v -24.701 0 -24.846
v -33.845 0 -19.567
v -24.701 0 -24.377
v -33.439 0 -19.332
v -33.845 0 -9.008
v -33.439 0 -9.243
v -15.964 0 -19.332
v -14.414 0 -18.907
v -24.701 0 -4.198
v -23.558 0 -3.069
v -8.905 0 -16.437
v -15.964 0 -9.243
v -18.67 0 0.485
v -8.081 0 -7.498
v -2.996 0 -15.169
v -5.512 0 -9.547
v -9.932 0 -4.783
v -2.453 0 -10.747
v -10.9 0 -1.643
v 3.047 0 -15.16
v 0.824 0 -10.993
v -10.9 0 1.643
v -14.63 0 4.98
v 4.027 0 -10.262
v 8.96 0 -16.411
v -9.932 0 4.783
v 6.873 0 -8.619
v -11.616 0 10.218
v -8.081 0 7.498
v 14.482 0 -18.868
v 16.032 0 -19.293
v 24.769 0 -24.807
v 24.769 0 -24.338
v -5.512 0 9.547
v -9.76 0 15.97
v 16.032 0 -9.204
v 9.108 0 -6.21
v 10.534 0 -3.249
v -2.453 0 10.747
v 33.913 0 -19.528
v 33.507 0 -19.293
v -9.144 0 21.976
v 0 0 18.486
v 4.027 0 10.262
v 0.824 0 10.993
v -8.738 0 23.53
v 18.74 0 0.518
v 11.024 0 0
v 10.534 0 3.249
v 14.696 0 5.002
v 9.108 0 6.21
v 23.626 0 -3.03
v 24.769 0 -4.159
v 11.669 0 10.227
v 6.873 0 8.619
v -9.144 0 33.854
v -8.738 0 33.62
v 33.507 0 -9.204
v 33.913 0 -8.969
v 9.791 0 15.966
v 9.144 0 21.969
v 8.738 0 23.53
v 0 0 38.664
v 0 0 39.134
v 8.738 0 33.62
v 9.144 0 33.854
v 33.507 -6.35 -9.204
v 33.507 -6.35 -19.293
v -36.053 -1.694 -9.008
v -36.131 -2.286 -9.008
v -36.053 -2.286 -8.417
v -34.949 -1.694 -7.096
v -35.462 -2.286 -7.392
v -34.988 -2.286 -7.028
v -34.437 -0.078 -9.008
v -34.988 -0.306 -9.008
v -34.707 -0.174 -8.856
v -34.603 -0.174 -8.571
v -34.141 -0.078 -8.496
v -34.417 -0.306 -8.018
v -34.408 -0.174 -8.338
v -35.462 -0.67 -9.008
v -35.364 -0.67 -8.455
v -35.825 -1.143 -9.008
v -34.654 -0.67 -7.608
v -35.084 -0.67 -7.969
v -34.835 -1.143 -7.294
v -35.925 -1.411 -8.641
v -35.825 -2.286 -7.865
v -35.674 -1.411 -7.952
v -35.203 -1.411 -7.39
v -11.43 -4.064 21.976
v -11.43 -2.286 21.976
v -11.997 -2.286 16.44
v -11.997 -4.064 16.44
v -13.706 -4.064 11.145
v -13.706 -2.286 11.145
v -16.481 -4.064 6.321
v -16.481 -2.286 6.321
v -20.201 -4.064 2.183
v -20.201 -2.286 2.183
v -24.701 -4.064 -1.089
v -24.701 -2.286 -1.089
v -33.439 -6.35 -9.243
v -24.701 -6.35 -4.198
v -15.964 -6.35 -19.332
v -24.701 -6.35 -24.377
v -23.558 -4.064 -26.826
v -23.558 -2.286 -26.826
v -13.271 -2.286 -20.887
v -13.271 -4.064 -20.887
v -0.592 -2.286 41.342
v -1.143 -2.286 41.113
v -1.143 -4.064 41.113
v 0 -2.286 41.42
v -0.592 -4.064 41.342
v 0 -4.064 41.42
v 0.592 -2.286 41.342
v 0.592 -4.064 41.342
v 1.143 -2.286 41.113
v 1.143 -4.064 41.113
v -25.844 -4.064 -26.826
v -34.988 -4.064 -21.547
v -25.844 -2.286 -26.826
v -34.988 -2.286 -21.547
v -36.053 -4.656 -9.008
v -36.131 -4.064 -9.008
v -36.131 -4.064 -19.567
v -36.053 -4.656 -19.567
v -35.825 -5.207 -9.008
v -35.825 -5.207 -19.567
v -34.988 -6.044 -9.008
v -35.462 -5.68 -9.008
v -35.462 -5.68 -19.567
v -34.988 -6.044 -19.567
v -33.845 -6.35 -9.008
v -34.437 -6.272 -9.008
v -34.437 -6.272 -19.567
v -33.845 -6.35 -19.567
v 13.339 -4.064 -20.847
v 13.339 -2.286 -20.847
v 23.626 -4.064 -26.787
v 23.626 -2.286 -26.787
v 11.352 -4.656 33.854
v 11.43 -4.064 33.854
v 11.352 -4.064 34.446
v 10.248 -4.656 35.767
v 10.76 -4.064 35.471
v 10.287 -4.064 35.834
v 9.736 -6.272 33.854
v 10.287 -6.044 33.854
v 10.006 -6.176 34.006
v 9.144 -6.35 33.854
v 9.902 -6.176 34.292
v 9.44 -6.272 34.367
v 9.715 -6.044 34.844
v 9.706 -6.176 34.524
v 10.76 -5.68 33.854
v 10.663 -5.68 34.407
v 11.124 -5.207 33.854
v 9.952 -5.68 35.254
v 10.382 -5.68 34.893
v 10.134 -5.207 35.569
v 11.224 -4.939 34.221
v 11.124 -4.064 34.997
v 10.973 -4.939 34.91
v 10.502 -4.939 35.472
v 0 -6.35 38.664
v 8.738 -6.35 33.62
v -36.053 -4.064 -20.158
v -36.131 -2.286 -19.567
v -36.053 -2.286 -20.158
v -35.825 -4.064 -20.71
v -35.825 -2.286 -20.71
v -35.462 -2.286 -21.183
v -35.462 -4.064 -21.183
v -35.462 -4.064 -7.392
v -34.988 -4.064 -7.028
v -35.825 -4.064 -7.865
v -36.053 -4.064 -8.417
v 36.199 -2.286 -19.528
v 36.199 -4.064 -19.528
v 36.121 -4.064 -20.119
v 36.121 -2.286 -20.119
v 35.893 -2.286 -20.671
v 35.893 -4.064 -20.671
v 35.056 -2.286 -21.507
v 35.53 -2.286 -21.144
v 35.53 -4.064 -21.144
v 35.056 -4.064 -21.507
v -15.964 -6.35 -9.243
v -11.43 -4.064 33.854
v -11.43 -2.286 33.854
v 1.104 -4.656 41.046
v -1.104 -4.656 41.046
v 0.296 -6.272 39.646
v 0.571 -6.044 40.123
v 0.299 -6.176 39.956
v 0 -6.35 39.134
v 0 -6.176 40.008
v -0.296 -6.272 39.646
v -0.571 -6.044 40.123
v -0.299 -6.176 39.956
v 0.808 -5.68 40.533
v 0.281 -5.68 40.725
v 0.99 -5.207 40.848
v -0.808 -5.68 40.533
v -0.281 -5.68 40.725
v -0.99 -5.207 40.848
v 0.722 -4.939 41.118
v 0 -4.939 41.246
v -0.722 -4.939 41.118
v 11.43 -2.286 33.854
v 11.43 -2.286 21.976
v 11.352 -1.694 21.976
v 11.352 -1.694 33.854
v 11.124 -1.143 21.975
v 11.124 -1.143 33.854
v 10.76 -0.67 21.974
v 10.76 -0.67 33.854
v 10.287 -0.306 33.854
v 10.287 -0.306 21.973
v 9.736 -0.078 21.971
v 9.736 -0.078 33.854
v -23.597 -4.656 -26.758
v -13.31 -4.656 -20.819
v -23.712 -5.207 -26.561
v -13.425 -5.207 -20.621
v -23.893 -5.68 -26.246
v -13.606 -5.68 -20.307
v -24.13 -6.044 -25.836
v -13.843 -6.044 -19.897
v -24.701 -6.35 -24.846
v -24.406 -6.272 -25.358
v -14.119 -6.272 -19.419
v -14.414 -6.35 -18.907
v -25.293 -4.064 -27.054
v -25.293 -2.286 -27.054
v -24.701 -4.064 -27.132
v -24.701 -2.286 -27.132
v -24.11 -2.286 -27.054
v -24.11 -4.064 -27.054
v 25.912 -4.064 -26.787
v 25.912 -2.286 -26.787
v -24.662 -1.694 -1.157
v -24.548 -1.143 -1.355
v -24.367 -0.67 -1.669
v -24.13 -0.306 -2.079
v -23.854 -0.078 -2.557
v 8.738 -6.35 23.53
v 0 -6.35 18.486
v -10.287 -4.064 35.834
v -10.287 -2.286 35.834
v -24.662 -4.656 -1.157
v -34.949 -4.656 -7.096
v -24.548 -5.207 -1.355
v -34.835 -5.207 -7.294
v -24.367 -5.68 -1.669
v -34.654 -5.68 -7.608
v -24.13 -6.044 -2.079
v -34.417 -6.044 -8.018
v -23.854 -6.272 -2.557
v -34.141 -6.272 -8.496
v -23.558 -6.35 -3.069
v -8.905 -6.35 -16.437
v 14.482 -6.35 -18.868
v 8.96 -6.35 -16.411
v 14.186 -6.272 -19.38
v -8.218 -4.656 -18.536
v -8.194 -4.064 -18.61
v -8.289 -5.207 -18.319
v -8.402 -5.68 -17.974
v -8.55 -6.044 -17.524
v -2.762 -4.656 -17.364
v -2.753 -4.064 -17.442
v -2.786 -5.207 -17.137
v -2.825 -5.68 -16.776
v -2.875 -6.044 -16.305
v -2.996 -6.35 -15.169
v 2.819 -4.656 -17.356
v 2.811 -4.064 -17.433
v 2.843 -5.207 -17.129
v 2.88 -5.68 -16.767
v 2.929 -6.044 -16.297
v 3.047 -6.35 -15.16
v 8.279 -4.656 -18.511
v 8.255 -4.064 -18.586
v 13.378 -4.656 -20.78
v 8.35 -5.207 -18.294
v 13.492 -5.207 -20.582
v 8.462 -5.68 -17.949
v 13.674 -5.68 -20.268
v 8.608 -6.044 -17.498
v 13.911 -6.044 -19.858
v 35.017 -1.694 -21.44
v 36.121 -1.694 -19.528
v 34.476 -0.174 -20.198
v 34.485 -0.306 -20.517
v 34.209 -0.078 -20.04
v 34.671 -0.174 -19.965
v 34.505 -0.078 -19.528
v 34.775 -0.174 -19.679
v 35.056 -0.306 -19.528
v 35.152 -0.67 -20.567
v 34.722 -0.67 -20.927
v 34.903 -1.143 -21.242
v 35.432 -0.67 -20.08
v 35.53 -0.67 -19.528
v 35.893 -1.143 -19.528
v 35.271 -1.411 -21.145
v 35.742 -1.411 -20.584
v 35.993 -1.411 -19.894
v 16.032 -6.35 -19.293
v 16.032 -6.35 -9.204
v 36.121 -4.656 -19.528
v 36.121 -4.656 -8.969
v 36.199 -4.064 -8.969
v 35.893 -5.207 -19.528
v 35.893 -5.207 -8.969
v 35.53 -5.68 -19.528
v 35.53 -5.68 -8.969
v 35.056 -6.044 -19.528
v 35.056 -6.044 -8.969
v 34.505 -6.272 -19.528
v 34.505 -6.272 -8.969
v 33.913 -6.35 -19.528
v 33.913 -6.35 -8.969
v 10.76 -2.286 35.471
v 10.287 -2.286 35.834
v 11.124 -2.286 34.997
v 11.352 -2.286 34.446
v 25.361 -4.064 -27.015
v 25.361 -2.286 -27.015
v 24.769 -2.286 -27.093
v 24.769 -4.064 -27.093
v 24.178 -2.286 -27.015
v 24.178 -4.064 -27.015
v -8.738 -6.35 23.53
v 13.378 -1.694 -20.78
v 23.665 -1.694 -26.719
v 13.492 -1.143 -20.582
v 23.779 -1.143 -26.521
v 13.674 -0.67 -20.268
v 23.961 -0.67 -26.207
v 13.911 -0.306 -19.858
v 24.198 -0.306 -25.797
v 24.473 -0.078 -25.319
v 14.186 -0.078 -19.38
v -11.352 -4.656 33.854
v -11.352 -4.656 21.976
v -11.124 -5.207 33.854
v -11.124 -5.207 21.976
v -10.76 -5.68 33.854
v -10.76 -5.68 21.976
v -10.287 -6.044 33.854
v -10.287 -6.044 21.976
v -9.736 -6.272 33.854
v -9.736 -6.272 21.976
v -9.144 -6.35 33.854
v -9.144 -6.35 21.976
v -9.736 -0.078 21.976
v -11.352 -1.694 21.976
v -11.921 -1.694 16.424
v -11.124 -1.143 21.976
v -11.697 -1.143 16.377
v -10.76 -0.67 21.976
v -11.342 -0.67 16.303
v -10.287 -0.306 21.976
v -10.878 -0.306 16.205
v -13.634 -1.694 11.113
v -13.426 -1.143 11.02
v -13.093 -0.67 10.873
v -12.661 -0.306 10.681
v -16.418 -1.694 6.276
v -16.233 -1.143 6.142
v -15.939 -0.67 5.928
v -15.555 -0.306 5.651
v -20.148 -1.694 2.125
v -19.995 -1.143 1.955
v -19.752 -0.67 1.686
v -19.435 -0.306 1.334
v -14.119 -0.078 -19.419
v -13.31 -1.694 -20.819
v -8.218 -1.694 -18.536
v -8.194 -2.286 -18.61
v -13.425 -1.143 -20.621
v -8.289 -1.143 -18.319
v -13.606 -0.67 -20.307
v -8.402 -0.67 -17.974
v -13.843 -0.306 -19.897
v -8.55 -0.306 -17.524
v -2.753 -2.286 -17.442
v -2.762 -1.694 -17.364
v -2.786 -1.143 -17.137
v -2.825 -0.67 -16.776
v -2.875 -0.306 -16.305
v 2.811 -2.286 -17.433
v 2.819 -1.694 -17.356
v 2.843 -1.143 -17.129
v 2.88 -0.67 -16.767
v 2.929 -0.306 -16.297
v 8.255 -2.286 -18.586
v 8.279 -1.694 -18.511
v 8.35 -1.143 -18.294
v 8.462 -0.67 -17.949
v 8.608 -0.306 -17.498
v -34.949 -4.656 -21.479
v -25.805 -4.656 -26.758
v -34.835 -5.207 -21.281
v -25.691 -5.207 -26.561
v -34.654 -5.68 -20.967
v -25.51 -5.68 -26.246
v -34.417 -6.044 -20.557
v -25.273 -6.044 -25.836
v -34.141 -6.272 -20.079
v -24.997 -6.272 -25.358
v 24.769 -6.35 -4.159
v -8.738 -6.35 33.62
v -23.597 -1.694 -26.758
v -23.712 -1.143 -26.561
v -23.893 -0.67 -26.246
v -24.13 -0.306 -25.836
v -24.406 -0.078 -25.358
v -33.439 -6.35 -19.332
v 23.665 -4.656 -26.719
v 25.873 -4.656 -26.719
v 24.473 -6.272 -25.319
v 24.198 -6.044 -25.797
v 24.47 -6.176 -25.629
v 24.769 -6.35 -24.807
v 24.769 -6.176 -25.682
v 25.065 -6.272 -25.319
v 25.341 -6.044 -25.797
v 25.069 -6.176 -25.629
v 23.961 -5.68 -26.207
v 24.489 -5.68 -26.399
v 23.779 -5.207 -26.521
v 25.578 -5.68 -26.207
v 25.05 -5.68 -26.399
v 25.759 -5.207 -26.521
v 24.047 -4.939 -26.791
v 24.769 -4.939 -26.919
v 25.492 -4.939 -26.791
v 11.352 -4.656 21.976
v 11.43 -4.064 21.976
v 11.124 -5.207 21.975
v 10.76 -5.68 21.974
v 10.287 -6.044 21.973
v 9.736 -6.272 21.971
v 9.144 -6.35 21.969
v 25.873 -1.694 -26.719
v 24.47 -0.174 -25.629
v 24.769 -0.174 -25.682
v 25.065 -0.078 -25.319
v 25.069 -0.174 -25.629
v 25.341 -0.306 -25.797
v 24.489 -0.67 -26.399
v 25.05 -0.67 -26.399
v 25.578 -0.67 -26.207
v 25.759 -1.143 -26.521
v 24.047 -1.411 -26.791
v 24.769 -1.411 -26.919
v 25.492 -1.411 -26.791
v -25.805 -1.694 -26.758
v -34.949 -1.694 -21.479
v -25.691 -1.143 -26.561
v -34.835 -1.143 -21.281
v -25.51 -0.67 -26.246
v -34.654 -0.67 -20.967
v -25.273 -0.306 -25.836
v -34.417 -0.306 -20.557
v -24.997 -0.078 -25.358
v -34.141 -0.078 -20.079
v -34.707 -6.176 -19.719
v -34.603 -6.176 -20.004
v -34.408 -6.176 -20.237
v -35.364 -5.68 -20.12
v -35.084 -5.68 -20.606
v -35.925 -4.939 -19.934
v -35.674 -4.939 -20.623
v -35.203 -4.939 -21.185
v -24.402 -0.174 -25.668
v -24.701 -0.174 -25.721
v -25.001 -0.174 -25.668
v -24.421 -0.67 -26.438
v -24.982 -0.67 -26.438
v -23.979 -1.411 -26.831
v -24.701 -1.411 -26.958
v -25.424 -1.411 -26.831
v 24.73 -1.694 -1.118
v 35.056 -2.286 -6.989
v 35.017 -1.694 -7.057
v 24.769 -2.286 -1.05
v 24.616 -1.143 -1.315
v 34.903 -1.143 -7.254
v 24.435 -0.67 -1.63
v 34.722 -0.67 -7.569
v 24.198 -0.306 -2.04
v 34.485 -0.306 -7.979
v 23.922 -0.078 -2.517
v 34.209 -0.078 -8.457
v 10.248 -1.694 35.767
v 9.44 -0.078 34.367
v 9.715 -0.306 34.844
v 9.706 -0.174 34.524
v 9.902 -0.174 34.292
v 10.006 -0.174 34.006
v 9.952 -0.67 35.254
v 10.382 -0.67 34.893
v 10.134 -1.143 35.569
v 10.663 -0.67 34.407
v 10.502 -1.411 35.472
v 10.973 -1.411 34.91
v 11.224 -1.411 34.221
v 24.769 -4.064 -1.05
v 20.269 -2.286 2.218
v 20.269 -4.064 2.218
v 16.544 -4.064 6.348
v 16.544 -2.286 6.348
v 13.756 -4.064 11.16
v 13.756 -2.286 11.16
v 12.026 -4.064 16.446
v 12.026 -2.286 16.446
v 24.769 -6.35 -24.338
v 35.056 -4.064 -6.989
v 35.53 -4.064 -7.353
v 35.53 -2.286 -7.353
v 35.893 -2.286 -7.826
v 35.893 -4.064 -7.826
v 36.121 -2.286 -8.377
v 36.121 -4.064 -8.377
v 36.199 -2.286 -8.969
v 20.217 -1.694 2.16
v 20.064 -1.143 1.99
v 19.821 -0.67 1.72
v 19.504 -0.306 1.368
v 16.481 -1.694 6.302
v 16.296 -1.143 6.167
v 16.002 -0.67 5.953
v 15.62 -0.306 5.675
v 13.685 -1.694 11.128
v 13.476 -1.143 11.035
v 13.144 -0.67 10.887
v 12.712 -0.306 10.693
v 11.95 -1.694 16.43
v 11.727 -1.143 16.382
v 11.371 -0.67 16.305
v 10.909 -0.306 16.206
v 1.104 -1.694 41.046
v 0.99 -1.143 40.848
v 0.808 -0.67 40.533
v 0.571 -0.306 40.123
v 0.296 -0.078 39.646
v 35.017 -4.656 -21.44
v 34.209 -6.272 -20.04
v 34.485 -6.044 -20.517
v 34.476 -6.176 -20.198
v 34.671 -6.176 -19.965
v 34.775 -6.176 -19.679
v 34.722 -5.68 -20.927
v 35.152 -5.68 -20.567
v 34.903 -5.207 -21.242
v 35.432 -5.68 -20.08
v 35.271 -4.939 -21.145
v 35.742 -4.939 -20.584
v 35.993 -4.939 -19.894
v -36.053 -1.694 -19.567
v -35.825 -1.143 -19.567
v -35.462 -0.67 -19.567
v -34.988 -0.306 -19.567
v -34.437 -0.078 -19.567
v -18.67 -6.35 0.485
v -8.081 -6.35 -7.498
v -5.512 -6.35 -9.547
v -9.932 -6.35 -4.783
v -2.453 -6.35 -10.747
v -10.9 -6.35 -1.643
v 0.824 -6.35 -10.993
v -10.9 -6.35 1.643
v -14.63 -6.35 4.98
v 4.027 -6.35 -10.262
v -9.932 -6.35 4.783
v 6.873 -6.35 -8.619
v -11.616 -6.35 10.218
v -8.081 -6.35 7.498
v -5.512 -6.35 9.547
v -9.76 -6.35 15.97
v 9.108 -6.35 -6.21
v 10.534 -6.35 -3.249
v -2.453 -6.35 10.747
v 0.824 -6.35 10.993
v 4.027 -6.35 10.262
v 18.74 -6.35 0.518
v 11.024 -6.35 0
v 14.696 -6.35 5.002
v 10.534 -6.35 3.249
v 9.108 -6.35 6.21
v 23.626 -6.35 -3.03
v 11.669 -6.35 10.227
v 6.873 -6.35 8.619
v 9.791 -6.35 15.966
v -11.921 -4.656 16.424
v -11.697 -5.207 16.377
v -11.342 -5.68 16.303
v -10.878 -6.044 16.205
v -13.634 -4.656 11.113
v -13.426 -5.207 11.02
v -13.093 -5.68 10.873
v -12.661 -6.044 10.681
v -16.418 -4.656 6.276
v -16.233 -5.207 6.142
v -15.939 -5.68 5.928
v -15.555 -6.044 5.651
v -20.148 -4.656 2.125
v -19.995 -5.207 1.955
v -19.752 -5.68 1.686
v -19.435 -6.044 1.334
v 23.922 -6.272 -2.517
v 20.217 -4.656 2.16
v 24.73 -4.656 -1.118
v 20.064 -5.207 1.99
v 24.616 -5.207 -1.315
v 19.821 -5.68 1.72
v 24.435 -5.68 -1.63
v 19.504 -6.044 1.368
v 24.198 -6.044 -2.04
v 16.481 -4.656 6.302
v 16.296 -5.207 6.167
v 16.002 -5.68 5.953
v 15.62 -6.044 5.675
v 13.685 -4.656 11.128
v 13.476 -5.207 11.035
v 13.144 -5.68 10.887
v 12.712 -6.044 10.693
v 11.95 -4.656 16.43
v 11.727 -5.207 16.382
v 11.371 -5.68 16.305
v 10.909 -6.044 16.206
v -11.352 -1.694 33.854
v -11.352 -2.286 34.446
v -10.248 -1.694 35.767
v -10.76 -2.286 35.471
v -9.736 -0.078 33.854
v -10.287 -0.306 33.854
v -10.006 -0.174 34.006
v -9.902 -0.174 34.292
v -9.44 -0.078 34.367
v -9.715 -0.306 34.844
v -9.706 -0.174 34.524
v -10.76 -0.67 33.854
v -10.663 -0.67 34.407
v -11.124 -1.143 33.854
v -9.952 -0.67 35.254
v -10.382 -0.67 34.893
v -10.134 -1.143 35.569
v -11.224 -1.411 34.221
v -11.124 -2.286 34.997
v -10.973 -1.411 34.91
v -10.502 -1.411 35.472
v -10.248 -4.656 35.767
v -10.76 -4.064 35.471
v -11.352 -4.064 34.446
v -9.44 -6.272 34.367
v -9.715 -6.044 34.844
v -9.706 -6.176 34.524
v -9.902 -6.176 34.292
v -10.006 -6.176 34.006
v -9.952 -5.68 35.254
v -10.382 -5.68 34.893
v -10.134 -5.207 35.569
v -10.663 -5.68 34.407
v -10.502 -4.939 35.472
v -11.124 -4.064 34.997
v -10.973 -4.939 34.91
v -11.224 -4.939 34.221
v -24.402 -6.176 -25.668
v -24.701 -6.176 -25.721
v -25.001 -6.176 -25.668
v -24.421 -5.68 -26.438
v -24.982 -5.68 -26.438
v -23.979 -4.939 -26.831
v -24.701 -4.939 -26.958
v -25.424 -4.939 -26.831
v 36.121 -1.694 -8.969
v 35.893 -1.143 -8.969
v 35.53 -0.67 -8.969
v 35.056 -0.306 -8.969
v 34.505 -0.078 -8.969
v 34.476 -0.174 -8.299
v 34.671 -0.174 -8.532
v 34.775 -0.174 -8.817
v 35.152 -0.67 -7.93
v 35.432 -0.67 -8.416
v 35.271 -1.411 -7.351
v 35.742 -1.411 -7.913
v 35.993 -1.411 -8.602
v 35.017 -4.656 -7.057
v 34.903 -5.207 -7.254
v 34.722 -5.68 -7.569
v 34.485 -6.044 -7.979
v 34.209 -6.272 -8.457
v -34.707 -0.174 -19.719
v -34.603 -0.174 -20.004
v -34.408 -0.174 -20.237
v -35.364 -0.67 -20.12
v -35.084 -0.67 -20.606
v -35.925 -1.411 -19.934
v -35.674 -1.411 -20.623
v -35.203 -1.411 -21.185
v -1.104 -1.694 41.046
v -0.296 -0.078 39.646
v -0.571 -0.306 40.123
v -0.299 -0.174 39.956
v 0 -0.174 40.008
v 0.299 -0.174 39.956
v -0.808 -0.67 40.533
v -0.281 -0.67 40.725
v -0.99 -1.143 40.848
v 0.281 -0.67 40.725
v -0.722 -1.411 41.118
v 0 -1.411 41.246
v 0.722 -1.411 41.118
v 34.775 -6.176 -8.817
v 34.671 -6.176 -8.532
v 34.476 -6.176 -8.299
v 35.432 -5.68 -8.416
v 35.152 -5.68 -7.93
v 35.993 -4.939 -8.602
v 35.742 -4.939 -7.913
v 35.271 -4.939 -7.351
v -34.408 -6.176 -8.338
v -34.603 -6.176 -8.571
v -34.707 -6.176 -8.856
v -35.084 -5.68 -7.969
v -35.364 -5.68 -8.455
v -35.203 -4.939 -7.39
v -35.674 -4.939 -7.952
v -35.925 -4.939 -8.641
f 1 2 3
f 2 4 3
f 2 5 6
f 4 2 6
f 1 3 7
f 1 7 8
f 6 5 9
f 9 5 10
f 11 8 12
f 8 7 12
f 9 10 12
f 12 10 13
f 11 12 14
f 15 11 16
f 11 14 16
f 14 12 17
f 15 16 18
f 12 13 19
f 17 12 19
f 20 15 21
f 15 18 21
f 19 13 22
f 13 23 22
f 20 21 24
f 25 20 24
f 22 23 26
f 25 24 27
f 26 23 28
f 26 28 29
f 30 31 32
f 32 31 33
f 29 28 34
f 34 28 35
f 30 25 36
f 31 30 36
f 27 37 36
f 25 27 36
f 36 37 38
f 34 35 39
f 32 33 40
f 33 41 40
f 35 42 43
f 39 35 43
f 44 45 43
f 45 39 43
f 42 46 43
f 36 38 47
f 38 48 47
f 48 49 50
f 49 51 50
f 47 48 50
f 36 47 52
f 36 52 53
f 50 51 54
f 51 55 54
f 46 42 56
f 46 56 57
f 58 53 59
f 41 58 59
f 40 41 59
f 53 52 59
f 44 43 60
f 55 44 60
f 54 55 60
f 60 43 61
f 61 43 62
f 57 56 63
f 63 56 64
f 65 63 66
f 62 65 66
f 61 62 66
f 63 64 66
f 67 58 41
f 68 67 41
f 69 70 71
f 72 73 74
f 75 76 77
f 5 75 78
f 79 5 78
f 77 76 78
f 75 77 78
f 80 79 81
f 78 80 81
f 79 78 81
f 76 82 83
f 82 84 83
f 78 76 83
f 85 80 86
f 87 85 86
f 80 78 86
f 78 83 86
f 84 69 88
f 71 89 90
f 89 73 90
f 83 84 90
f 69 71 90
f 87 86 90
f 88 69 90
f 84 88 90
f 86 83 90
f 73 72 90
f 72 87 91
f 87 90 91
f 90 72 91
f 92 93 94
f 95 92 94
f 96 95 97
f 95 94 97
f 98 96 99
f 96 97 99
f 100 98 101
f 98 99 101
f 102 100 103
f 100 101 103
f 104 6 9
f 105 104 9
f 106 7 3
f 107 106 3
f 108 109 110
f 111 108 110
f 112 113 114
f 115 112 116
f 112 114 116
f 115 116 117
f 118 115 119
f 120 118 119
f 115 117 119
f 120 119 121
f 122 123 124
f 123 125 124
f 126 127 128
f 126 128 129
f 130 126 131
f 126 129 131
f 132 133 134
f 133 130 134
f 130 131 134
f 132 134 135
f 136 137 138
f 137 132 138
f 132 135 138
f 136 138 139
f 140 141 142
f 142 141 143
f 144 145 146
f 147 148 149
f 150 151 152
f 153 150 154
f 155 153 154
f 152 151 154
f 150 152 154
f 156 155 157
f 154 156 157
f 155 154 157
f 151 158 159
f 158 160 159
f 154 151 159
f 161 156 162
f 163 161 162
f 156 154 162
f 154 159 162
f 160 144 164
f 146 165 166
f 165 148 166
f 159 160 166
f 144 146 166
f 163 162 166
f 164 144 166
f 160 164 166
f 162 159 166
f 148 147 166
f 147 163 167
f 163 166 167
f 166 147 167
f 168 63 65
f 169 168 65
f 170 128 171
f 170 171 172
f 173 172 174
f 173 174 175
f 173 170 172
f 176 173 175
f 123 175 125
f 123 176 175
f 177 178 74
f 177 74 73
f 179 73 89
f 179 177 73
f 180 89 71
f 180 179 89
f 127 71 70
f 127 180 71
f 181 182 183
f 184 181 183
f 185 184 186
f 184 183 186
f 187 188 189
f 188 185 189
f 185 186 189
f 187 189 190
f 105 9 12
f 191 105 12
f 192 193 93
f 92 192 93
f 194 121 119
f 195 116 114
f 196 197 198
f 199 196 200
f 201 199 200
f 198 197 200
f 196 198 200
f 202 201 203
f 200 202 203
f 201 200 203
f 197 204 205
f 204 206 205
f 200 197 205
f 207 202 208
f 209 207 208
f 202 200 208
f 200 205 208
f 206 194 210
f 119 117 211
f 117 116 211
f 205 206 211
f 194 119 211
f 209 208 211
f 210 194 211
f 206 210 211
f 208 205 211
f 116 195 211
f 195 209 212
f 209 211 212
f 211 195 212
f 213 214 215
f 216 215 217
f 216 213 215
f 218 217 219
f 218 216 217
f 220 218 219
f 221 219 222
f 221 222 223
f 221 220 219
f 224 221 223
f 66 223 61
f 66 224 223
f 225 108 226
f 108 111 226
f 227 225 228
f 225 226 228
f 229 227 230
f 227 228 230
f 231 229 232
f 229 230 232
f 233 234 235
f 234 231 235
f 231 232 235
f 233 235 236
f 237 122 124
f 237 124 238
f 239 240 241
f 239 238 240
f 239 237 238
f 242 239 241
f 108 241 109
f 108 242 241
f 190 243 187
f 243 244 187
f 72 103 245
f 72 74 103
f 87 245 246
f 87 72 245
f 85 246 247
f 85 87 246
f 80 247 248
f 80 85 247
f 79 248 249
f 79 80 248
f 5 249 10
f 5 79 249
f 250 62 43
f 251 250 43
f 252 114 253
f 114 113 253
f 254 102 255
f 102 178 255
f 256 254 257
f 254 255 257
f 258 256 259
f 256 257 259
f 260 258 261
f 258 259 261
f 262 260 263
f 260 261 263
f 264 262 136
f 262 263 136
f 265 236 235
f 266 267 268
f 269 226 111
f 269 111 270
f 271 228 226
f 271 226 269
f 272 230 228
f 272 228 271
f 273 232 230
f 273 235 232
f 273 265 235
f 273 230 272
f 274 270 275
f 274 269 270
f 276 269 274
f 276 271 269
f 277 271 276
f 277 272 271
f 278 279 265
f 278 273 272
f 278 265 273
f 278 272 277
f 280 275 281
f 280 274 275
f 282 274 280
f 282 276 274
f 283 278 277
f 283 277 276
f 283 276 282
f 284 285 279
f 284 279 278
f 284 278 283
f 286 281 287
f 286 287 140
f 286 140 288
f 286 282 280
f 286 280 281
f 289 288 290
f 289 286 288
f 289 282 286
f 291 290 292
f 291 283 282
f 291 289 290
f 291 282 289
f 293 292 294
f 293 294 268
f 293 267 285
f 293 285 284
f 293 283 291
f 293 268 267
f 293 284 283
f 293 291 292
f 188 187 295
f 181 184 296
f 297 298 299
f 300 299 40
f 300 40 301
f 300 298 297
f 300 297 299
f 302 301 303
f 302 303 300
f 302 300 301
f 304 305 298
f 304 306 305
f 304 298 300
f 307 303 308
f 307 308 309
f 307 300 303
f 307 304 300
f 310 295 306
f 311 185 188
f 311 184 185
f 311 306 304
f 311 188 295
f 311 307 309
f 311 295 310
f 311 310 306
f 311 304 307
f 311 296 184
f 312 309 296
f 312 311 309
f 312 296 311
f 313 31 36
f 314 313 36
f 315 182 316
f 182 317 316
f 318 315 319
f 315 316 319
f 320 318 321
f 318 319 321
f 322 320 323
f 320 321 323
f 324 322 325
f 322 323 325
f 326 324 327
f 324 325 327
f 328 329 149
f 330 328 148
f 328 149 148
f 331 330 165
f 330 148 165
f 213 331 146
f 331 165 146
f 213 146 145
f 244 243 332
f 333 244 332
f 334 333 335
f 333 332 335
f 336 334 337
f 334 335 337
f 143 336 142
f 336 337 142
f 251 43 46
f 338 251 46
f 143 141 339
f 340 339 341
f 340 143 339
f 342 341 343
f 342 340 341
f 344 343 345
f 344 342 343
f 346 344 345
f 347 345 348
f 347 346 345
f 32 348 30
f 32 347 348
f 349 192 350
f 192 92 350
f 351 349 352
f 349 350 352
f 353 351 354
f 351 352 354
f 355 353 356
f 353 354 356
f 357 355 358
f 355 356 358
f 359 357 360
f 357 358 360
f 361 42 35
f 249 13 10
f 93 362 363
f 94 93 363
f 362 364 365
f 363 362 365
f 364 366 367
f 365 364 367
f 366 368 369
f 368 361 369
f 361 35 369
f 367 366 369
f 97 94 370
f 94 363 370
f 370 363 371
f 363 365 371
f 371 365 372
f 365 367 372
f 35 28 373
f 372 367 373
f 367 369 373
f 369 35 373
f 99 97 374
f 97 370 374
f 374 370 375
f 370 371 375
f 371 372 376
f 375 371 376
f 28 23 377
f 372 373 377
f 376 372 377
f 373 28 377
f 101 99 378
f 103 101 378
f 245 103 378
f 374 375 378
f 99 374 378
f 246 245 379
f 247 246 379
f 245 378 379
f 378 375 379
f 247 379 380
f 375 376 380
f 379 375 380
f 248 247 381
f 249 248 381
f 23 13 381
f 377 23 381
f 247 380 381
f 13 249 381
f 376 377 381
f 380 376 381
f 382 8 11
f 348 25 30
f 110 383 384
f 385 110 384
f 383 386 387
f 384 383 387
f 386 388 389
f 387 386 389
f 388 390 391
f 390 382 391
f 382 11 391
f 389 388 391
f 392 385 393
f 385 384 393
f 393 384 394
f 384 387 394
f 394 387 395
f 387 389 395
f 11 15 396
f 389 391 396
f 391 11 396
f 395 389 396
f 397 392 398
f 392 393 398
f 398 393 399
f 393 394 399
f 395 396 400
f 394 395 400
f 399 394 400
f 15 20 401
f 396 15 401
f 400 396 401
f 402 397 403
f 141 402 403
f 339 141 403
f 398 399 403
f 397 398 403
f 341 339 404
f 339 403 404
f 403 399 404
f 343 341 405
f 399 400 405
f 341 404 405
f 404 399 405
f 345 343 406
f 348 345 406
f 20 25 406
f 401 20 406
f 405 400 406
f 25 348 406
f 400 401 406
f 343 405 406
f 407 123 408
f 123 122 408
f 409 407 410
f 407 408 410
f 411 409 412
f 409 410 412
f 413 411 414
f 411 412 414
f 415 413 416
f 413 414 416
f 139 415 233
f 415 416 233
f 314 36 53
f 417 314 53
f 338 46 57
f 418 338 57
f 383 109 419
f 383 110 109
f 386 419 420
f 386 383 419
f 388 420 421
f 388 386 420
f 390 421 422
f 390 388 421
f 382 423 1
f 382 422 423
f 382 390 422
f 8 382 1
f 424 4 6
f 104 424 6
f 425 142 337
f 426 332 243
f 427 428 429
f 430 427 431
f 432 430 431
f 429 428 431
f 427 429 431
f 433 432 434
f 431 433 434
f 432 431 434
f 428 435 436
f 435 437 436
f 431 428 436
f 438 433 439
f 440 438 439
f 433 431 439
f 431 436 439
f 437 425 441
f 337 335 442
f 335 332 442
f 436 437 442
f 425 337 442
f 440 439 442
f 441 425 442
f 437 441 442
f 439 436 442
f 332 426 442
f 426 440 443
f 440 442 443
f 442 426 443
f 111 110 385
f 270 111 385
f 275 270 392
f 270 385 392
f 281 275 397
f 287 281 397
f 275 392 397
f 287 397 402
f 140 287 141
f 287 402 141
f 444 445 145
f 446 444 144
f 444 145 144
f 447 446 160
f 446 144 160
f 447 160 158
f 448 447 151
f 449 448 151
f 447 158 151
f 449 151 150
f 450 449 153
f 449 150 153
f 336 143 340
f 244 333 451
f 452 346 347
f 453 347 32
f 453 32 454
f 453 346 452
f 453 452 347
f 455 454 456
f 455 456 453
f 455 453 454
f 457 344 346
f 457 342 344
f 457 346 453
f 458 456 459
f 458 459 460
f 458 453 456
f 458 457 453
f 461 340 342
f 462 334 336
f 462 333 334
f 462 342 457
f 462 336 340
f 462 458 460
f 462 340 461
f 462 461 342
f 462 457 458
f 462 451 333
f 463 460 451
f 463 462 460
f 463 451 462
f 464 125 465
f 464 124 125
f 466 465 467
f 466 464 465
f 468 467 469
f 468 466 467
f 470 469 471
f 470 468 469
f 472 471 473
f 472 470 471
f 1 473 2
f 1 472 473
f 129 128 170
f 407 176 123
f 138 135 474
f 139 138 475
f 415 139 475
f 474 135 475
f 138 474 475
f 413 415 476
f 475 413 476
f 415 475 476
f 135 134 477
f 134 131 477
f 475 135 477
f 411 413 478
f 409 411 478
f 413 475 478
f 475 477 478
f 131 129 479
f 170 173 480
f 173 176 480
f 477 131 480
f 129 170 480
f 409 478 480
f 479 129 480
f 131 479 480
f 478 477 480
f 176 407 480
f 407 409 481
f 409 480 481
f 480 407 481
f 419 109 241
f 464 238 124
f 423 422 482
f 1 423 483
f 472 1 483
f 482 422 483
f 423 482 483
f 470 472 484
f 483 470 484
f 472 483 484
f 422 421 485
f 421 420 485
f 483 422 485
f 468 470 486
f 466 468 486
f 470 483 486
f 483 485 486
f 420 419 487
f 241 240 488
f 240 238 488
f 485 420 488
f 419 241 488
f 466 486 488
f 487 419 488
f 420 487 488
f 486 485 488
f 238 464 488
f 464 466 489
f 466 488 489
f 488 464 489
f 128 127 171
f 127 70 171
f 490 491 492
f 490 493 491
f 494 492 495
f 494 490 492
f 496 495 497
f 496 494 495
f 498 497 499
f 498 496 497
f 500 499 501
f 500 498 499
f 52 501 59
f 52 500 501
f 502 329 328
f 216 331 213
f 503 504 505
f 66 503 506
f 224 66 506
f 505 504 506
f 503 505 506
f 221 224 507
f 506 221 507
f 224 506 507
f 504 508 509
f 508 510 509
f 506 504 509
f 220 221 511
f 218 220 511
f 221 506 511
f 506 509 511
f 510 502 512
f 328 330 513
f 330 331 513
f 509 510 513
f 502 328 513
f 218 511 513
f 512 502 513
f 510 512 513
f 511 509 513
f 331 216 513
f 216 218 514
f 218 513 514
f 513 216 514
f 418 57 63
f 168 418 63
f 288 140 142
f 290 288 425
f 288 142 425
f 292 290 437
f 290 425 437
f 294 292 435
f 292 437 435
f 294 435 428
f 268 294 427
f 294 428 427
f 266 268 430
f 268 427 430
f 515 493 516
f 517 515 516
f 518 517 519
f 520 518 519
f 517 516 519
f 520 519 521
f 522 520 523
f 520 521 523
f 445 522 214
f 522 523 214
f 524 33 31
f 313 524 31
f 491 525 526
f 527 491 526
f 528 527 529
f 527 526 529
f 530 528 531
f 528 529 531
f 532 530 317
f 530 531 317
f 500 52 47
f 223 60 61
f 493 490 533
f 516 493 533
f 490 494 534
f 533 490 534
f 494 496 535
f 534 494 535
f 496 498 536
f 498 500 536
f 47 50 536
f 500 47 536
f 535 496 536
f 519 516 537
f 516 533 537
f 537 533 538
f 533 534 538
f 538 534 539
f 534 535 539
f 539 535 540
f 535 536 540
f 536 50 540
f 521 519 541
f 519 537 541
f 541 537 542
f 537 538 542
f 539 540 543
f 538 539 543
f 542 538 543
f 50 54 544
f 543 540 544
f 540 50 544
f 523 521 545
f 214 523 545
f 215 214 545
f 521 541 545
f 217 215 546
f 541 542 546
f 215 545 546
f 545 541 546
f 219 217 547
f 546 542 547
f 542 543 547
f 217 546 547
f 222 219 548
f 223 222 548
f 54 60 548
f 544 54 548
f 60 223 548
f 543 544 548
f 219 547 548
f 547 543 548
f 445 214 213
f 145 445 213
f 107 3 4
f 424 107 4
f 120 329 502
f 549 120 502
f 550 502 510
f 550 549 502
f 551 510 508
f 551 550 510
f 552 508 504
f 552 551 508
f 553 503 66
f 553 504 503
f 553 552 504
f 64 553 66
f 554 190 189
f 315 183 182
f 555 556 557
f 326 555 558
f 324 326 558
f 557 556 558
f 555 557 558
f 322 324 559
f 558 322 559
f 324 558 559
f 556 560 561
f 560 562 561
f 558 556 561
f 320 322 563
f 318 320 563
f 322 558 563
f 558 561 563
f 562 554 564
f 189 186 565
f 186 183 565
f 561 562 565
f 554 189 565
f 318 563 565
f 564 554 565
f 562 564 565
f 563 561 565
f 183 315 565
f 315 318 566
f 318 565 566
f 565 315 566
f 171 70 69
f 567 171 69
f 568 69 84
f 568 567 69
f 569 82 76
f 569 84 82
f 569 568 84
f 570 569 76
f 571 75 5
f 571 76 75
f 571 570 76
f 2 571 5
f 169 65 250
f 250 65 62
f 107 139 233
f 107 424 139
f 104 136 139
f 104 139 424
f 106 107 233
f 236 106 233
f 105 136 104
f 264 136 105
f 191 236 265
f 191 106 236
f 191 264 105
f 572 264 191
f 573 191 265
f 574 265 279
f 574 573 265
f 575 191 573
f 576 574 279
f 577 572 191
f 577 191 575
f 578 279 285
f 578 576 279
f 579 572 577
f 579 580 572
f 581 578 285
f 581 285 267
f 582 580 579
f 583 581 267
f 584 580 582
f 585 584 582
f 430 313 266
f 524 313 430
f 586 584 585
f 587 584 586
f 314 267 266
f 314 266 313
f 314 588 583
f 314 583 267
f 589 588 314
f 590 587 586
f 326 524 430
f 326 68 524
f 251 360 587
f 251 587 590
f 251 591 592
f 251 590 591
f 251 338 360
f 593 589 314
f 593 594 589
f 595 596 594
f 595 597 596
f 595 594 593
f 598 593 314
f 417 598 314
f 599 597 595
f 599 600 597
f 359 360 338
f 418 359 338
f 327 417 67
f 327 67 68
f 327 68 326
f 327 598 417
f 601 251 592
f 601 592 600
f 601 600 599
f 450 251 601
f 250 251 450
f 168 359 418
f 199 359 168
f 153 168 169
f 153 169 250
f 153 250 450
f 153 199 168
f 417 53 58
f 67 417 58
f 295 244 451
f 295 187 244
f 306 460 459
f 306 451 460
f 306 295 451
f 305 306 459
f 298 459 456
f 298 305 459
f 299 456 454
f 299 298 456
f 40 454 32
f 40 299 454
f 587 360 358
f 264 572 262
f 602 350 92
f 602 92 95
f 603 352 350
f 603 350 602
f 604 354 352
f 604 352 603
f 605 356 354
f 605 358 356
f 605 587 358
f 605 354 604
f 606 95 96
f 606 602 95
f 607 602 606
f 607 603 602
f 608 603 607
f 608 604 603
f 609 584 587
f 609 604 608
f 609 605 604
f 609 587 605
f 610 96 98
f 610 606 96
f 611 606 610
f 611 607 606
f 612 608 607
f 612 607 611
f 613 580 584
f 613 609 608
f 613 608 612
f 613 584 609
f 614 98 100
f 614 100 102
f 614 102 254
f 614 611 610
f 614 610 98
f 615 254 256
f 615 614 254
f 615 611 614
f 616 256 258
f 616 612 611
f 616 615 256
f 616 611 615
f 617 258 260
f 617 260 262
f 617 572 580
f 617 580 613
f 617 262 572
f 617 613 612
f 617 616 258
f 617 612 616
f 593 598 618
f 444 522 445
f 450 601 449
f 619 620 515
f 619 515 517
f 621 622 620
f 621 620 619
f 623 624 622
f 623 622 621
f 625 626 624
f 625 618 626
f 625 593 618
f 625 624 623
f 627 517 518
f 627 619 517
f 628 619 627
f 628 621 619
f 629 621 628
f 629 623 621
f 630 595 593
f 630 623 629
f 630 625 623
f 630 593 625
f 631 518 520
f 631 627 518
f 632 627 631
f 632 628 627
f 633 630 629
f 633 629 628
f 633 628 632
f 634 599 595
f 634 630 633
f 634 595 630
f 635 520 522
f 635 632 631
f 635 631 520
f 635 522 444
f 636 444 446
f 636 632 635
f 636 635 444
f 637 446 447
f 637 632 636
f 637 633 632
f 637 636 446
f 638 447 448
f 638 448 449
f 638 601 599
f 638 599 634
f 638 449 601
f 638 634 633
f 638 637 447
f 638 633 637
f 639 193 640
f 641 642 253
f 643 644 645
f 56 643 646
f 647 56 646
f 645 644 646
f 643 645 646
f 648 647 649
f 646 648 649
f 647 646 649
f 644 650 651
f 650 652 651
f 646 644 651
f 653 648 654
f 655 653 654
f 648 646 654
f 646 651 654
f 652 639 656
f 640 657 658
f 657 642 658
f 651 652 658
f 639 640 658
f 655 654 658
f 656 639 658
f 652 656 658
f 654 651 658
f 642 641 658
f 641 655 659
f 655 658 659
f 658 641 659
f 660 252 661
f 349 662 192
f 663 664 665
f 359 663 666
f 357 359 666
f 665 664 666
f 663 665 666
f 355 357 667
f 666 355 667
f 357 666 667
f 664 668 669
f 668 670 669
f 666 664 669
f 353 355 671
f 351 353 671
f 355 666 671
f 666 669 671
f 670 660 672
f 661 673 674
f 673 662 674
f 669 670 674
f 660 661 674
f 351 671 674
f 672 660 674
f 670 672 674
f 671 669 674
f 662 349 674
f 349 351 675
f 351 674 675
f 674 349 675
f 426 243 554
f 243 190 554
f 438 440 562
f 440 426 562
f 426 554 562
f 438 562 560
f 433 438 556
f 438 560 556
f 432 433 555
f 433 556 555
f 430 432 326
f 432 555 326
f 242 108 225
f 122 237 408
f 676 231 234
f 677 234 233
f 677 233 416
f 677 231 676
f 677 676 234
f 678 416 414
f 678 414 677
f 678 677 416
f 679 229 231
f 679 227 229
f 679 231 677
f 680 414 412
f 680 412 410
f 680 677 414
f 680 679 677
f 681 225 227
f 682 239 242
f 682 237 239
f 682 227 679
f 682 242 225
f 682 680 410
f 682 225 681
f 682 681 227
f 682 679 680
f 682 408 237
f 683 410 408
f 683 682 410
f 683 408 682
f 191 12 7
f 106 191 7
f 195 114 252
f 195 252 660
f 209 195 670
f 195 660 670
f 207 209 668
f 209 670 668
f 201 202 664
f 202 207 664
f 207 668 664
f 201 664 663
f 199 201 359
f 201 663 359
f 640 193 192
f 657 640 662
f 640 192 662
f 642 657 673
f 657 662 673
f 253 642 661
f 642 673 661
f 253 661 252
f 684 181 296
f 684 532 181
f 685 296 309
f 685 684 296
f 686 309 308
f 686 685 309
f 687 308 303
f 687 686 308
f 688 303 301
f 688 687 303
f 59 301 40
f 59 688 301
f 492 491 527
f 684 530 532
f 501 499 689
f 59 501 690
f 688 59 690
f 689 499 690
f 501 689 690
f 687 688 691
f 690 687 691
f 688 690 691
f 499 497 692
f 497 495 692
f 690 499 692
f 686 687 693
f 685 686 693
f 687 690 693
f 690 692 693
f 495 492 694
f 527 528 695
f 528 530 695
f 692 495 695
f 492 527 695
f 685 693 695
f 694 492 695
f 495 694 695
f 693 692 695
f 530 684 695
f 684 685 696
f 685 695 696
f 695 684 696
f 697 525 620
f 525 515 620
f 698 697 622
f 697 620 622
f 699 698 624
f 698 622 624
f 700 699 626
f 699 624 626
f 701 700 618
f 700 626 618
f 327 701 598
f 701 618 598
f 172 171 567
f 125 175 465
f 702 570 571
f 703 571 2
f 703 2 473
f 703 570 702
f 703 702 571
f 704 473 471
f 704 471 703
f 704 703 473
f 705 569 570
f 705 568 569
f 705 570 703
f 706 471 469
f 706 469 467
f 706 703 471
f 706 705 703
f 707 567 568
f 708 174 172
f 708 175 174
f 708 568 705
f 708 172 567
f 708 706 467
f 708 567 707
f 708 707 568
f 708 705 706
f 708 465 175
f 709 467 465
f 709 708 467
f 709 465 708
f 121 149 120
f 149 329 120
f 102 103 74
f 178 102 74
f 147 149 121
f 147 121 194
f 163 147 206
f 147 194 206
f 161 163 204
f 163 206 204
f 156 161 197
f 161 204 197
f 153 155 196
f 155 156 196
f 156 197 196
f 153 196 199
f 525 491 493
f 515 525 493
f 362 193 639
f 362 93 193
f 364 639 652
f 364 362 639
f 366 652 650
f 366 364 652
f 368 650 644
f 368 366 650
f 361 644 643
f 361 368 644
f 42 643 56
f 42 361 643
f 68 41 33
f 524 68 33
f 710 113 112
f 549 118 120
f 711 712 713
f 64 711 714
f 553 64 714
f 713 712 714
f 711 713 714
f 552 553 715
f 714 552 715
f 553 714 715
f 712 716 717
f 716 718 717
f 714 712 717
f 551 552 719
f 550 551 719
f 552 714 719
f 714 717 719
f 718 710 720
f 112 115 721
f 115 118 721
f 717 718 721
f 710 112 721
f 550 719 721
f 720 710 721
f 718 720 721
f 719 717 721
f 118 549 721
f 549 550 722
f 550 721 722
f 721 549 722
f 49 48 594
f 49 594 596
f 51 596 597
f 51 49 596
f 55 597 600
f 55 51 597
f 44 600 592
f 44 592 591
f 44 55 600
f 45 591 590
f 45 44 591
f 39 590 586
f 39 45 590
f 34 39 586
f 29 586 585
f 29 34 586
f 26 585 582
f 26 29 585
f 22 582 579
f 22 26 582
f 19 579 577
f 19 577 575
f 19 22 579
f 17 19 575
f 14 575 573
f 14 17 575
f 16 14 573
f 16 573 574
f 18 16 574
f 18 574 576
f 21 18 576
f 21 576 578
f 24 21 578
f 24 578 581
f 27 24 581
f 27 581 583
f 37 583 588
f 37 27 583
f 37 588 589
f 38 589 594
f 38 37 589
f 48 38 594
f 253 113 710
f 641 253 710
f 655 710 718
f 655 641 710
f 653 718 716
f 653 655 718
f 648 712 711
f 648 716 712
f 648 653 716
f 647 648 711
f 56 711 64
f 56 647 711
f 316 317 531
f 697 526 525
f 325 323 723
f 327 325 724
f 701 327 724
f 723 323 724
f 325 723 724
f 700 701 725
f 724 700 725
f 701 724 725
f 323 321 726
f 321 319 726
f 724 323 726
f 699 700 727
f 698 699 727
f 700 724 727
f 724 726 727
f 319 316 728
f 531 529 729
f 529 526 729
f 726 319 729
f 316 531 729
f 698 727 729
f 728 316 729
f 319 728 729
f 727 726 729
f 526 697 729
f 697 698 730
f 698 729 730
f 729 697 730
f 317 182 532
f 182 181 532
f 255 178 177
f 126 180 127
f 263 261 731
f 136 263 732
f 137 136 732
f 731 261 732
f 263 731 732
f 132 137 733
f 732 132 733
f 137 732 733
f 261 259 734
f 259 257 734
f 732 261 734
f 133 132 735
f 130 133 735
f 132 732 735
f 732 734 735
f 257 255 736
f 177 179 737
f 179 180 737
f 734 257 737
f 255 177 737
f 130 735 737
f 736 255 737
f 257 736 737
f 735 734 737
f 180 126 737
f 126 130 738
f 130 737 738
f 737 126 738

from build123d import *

# Parameters (mm, degrees)
F0_R     = 14.2875
F0_R_2   = 11.0236
F1_DEPTH = 6.35
F2_R     = 2.286


with BuildPart() as f1:
    # F0 (on Front) → F1 (new body)
    with BuildSketch(Plane.XZ):
        Polygon((-11.43, 35.174114), (-11.43, 21.975886), (0, 15.376773), (11.43, 21.975886), (11.43, 35.174114), (0, 41.773227), align=None)
        Polygon((0, 18.485689), (-8.7376, 23.530344), (-8.7376, 33.619656), (0, 38.664311), (8.7376, 33.619656), (8.7376, 23.530344), align=None, mode=Mode.SUBTRACT)
        with BuildLine():
            Line((0, 15.376773), (-11.43, 21.975886))
            ThreePointArc((-11.43, 21.975886), (-14.966436, 8.660036), (-24.701385, -1.089272))
            Line((-24.701385, -1.089272), (-13.271385, -7.688386))
            Line((-13.271385, -7.688386), (-13.271385, -20.886613))
            ThreePointArc((-13.271385, -20.886613), (0.028698, -17.291331), (13.339321, -20.84739))
            Line((13.339321, -20.84739), (13.339321, -7.649163))
            Line((13.339321, -7.649163), (24.769321, -1.050049))
            ThreePointArc((24.769321, -1.050049), (15.023862, 8.681056), (11.43, 21.975886))
            Line((11.43, 21.975886), (0, 15.376773))
        make_face()
        Circle(F0_R, mode=Mode.SUBTRACT)
        Polygon((-13.271385, -7.688386), (-24.701385, -1.089272), (-36.131385, -7.688386), (-36.131385, -20.886613), (-24.701385, -27.485727), (-13.271385, -20.886613), align=None)
        Polygon((-24.701385, -24.376811), (-33.438985, -19.332155), (-33.438985, -9.242844), (-24.701385, -4.198188), (-15.963785, -9.242844), (-15.963785, -19.332155), align=None, mode=Mode.SUBTRACT)
        Polygon((36.199321, -7.649163), (24.769321, -1.050049), (13.339321, -7.649163), (13.339321, -20.84739), (24.769321, -27.446504), (36.199321, -20.84739), align=None)
        Polygon((33.506921, -9.203621), (33.506921, -19.292932), (24.769321, -24.337588), (16.031721, -19.292932), (16.031721, -9.203621), (24.769321, -4.158965), align=None, mode=Mode.SUBTRACT)
        Circle(F0_R)
        Circle(F0_R_2, mode=Mode.SUBTRACT)
    extrude(amount=F1_DEPTH)

    # F2
    f2_edges = [f1.edges().sort_by_distance(p)[0] for p in [
        (0.028698, -6.35, -17.291331),
        (30.484321, -6.35, -24.146947),
        (36.199321, -6.35, -14.248276),
        (15.023862, -6.35, 8.681056),
        (11.43, -6.35, 28.575),
        (5.715, -6.35, 38.47367),
        (-5.715, -6.35, 38.47367),
        (-11.43, -6.35, 28.575),
        (-14.966436, -6.35, 8.660036),
        (-36.131385, -6.35, -14.2875),
        (-30.416385, -6.35, -24.18617),
        (-18.986385, -6.35, -24.18617),
        (-36.131385, 0, -14.2875),
        (-30.416385, 0, -4.388829),
        (-11.43, 0, 28.575),
        (-5.715, 0, 38.47367),
        (5.715, 0, 38.47367),
        (30.484321, -6.35, -4.349606),
        (11.43, 0, 28.575),
        (15.023862, 0, 8.681056),
        (0.028698, 0, -17.291331),
        (30.484321, 0, -24.146947),
        (19.054321, 0, -24.146947),
        (-30.416385, -6.35, -4.388829),
        (19.054321, -6.35, -24.146947),
        (-30.416385, 0, -24.18617),
        (36.199321, 0, -14.248276),
        (-14.966436, 0, 8.660036),
        (30.484321, 0, -4.349606),
        (-18.986385, 0, -24.18617),
        (0, -3.175, 41.773227),
        (-11.43, -3.175, 35.174114),
        (-11.43, -3.175, 21.975886),
        (-36.131385, -3.175, -7.688386),
        (-36.131385, -3.175, -20.886613),
        (-24.701385, -3.175, -27.485727),
        (24.769321, -3.175, -27.446504),
        (36.199321, -3.175, -20.84739),
        (36.199321, -3.175, -7.649163),
        (11.43, -3.175, 35.174114),
    ]]
    fillet(f2_edges, radius=F2_R)


solid = f1.part
